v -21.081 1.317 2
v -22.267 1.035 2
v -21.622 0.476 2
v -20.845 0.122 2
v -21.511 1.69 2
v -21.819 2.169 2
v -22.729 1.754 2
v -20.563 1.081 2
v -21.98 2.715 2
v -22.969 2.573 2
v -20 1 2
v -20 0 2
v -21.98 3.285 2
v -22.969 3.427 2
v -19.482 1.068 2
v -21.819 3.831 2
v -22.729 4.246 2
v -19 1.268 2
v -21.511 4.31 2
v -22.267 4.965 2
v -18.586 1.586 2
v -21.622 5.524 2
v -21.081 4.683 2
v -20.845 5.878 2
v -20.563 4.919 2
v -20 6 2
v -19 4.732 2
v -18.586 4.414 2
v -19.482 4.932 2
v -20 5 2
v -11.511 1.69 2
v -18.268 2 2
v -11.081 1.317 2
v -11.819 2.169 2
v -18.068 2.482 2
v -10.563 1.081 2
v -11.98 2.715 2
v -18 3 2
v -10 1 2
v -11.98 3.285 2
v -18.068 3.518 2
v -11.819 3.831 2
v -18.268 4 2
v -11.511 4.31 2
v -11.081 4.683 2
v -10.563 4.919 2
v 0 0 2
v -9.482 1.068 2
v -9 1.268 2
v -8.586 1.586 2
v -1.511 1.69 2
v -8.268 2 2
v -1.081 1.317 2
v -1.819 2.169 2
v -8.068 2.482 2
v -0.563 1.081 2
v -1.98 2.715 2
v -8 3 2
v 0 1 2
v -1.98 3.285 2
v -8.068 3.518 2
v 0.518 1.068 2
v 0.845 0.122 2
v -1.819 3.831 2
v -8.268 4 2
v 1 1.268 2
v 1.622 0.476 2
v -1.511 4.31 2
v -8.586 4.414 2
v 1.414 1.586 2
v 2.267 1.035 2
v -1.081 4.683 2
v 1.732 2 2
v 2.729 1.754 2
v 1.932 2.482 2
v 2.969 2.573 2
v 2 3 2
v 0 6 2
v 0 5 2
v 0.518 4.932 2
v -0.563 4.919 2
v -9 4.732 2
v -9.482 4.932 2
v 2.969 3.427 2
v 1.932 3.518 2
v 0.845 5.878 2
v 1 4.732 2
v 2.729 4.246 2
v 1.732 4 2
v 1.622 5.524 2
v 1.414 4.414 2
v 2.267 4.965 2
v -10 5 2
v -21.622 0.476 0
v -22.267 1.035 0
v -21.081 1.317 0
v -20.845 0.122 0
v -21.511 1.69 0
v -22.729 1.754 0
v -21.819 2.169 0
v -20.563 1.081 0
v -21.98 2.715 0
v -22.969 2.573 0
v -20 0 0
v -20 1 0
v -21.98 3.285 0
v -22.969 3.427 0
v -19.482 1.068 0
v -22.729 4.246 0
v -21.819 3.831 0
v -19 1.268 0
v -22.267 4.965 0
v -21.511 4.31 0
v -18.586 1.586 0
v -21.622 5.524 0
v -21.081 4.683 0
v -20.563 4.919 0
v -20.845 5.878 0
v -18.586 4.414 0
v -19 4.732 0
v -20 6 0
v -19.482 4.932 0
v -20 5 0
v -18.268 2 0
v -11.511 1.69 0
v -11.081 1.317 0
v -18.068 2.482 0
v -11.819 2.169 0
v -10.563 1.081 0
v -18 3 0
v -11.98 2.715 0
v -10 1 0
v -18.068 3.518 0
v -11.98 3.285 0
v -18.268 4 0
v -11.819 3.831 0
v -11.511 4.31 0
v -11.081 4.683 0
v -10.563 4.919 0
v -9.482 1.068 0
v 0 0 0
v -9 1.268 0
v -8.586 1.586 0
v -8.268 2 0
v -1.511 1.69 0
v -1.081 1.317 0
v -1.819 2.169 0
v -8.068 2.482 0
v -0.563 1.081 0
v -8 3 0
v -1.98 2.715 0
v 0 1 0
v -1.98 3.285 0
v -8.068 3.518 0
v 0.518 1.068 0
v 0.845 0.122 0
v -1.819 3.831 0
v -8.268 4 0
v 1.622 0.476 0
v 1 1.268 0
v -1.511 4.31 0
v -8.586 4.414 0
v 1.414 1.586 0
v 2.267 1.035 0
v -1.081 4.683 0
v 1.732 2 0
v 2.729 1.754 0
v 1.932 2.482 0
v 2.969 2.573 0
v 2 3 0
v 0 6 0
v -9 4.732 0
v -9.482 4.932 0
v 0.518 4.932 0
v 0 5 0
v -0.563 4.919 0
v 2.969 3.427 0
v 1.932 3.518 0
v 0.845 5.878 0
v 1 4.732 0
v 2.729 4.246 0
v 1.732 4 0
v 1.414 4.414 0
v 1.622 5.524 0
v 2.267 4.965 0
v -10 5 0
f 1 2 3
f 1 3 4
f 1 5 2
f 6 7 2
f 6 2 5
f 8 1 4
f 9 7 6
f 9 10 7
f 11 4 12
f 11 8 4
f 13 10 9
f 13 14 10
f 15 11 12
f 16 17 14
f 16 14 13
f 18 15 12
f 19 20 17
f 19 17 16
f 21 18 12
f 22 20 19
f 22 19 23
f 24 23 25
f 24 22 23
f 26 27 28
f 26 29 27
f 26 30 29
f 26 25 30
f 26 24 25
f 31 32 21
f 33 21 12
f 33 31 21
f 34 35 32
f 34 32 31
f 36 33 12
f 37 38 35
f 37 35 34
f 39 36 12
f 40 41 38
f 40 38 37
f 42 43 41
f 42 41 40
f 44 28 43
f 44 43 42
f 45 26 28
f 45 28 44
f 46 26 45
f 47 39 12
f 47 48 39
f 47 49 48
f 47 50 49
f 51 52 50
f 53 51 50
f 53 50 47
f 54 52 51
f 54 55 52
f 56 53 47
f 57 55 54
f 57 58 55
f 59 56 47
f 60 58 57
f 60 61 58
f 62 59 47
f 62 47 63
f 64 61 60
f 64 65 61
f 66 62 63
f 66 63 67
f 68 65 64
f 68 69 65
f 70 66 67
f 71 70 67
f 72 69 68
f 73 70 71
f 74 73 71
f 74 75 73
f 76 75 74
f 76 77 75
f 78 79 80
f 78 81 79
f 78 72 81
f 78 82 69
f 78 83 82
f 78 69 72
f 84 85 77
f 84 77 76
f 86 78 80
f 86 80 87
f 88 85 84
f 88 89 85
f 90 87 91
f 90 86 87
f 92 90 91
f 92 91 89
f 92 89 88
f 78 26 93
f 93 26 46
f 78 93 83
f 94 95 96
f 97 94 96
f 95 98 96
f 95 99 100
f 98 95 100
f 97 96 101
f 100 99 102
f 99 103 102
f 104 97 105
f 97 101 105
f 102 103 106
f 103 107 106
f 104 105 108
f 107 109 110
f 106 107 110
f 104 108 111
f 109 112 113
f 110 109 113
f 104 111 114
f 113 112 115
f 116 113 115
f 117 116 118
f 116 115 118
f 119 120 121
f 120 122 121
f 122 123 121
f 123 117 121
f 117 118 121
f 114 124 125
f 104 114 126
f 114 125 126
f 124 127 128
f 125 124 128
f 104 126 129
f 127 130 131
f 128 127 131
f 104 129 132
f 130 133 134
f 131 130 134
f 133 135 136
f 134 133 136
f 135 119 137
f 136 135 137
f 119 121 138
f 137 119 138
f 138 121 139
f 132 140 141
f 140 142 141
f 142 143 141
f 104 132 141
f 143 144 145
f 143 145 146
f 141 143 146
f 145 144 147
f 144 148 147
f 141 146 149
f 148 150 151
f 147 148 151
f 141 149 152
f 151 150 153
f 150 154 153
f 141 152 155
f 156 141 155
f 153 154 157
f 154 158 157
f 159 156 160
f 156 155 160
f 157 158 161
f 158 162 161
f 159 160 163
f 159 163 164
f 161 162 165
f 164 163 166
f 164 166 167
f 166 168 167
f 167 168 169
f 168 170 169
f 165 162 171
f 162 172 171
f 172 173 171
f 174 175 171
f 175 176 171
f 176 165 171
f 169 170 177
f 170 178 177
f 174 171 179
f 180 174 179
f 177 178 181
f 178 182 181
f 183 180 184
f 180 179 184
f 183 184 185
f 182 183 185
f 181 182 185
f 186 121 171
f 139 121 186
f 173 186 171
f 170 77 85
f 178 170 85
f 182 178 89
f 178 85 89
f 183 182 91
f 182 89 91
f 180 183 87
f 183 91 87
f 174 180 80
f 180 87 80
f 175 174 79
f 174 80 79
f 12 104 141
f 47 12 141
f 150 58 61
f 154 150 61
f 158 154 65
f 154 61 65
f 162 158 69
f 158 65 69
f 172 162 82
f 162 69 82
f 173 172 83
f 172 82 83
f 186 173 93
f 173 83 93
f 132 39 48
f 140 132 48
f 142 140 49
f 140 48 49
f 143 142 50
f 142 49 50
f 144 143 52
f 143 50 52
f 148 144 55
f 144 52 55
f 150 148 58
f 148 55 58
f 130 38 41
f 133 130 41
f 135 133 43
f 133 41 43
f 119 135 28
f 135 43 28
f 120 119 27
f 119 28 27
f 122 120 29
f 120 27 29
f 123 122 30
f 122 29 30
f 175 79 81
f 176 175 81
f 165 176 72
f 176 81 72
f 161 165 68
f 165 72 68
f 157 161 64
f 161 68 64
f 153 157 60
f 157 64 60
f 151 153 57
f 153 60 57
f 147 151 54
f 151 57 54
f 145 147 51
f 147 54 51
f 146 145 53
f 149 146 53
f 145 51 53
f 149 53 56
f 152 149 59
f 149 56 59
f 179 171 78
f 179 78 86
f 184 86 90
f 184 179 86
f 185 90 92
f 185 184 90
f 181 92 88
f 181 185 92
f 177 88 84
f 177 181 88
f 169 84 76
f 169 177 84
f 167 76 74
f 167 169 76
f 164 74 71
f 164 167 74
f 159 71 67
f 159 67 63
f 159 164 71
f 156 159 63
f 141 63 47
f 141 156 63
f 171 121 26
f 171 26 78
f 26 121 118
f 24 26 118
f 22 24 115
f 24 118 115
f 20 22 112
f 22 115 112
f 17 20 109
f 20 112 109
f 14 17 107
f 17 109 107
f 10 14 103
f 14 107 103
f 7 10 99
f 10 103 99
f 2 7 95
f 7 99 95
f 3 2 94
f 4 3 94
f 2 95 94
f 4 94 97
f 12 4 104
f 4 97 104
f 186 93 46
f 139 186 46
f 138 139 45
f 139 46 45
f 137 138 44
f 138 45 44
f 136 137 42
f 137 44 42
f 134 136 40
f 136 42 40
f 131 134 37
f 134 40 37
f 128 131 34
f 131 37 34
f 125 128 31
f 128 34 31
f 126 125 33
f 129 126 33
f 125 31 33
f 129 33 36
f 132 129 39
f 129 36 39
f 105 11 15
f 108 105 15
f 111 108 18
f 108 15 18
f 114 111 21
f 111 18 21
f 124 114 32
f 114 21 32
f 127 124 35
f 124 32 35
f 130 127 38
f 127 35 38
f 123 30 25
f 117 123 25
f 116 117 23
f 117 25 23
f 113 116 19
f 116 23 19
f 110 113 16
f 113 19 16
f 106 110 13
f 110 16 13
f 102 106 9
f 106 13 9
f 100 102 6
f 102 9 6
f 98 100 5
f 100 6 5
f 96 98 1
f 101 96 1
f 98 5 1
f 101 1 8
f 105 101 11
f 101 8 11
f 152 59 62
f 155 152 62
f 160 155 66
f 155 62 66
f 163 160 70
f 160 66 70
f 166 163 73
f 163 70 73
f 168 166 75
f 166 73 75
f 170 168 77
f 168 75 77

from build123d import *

# Parameters (mm, degrees)
SKETCH2_W           = 20
SKETCH2_H           = 6
BOSS_EXTRUDE2_DEPTH = 2
CUT_EXTRUDE1_DEPTH  = 6


with BuildPart() as part:
    # Sketch2 → Boss-Extrude2 (new body)
    with BuildSketch(Plane.XY):
        with BuildLine():
            Line((-20, 0), (-20, 6))
            ThreePointArc((-20, 6), (-23, 3), (-20, 0))
        make_face()
        with Locations((-10, 3)):
            Rectangle(SKETCH2_W, SKETCH2_H)
        with BuildLine():
            Line((0, 0), (0, 6))
            ThreePointArc((0, 6), (3, 3), (0, 0))
        make_face()
    extrude(amount=BOSS_EXTRUDE2_DEPTH)

    # Sketch4 → Cut-Extrude1 (cut)
    with BuildSketch(Plane.XY.offset(2)):
        with BuildLine():
            ThreePointArc((-18, 3), (-18.585786438, 4.414213562), (-20, 5))
            Line((-20, 5), (-20, 1))
            ThreePointArc((-20, 1), (-18.585786438, 1.585786438), (-18, 3))
        make_face()
        with BuildLine():
            Line((-20, 1), (-20, 5))
            ThreePointArc((-20, 5), (-22, 3), (-20, 1))
        make_face()
        with BuildLine():
            ThreePointArc((-8, 3), (-8.585786438, 4.414213562), (-10, 5))
            Line((-10, 5), (-10, 1))
            ThreePointArc((-10, 1), (-8.585786438, 1.585786438), (-8, 3))
        make_face()
        with BuildLine():
            Line((-10, 1), (-10, 5))
            ThreePointArc((-10, 5), (-12, 3), (-10, 1))
        make_face()
        with BuildLine():
            ThreePointArc((2, 3), (1.414213562, 4.414213562), (0, 5))
            Line((0, 5), (0, 1))
            ThreePointArc((0, 1), (1.414213562, 1.585786438), (2, 3))
        make_face()
        with BuildLine():
            Line((0, 1), (0, 5))
            ThreePointArc((0, 5), (-2, 3), (0, 1))
        make_face()
    extrude(amount=-CUT_EXTRUDE1_DEPTH, mode=Mode.SUBTRACT)


solid = part.part
